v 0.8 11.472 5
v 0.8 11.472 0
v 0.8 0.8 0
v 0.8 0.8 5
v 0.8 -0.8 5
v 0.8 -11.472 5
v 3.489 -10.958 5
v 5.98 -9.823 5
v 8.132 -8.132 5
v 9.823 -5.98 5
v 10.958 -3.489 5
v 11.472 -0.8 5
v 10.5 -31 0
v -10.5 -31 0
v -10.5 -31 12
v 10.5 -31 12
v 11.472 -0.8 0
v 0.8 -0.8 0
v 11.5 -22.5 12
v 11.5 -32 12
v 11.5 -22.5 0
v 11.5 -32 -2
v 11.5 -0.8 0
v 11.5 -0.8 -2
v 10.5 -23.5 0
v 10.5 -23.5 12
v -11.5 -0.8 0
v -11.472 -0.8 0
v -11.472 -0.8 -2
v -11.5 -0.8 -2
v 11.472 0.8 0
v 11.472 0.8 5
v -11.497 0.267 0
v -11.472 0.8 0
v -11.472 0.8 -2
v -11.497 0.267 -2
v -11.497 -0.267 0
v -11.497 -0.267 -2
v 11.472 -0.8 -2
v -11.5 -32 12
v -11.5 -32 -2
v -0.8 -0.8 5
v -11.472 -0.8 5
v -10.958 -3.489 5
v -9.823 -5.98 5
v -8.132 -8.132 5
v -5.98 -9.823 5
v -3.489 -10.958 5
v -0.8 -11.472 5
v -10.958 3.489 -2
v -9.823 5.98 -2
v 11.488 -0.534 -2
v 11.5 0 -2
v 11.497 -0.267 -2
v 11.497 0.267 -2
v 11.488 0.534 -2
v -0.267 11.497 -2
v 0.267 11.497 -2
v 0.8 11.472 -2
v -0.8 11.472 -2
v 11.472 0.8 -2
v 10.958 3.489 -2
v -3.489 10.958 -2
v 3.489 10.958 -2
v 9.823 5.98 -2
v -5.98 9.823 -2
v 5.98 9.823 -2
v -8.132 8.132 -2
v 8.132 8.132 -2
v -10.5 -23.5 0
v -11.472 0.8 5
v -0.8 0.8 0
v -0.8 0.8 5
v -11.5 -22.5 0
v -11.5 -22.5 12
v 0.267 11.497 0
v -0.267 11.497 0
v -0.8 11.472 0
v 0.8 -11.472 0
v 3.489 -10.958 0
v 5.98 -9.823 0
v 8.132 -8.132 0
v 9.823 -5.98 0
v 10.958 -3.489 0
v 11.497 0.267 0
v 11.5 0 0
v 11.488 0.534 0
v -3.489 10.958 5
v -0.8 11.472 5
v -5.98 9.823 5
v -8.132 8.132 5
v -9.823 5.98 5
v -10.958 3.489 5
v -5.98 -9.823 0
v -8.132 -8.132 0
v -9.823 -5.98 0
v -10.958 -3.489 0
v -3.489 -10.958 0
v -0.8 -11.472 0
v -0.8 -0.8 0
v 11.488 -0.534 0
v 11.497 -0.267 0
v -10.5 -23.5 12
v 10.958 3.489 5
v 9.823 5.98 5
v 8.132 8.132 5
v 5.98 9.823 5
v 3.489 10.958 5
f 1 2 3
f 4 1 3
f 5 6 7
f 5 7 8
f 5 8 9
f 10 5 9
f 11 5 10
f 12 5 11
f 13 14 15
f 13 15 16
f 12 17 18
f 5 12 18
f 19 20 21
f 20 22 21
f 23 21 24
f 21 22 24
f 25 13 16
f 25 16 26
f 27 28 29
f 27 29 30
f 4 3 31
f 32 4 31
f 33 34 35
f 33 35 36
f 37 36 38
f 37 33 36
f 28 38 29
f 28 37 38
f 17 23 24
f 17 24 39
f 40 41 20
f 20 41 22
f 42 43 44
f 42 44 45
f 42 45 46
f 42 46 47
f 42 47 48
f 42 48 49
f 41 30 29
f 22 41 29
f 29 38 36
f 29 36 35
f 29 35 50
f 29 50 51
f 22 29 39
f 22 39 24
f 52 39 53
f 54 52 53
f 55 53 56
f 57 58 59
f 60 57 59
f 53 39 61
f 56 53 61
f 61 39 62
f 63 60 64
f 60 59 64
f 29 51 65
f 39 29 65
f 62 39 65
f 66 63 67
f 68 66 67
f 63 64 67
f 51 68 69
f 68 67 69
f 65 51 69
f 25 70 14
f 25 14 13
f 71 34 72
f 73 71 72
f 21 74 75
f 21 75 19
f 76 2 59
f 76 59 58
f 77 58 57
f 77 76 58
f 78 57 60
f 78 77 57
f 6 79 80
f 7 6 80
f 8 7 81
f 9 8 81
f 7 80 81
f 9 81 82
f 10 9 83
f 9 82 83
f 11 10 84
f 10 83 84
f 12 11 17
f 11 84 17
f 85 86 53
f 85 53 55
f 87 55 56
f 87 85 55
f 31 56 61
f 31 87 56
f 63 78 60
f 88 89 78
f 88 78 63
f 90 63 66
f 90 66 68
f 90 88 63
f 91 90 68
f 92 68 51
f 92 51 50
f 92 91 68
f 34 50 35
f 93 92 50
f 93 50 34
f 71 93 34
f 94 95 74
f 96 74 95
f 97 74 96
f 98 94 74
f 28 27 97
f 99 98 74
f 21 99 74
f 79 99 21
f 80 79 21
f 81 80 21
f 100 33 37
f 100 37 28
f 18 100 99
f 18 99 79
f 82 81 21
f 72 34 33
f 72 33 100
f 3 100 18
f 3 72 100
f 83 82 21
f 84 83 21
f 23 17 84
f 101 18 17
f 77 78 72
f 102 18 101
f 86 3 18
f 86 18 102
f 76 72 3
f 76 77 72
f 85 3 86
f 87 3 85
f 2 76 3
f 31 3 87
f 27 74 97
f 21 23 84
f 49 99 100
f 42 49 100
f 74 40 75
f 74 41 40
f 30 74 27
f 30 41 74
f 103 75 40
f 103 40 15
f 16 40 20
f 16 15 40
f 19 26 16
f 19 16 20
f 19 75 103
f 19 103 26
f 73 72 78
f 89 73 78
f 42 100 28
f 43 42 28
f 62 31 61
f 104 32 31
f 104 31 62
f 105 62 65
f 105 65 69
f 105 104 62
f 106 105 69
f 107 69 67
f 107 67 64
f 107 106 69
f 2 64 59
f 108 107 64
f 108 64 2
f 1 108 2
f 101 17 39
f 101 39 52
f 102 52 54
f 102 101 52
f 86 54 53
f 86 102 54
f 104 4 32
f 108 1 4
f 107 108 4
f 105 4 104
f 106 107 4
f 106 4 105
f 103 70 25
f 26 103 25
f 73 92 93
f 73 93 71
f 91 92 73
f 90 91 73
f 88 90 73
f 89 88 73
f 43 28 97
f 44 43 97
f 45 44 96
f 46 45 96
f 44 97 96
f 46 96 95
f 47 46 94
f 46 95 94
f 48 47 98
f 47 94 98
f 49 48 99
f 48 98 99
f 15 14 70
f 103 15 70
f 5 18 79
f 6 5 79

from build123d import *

# Parameters (mm, degrees)
F0_W     = 23
F0_H     = 9.5
F0_W_2   = 21
F0_H_2   = 7.5
F1_DEPTH = 2
F2_DEPTH = 5
F3_DEPTH = 7
F4_DEPTH = 2


with BuildPart() as f1:
    # F0 (on Top) → F1 (new body)
    with BuildSketch(Plane.XY):
        with BuildLine():
            Line((-0.8, 0.8), (-0.8, 11.4721401665))
            ThreePointArc((-0.8, 11.4721401665), (-8.1317279836, 8.1317279836), (-11.4721401665, 0.8))
            Line((-11.4721401665, 0.8), (-0.8, 0.8))
        make_face()
        with BuildLine():
            ThreePointArc((11.4721401665, 0.8), (8.1317279836, 8.1317279836), (0.8, 11.4721401665))
            Line((0.8, 11.4721401665), (0.8, 0.8))
            Line((0.8, 0.8), (11.4721401665, 0.8))
        make_face()
        with Locations((0, -27.25)):
            Rectangle(F0_W, F0_H)
        with Locations((0, -27.25)):
            Rectangle(F0_W_2, F0_H_2, mode=Mode.SUBTRACT)
        with BuildLine():
            Line((-0.8, -0.8), (-11.4721401665, -0.8))
            ThreePointArc((-11.4721401665, -0.8), (-8.1317279836, -8.1317279836), (-0.8, -11.4721401665))
            Line((-0.8, -11.4721401665), (-0.8, -0.8))
        make_face()
        with BuildLine():
            Line((0.8, -0.8), (0.8, -11.4721401665))
            ThreePointArc((0.8, -11.4721401665), (8.1317279836, -8.1317279836), (11.4721401665, -0.8))
            Line((11.4721401665, -0.8), (0.8, -0.8))
        make_face()
        with BuildLine():
            ThreePointArc((-0.8, -11.4721401665), (-8.1317279836, -8.1317279836), (-11.4721401665, -0.8))
            Line((-11.4721401665, -0.8), (-11.5, -0.8))
            Line((-11.5, -0.8), (-11.5, -22.5))
            Line((-11.5, -22.5), (11.5, -22.5))
            Line((11.5, -22.5), (11.5, -0.8))
            Line((11.5, -0.8), (11.4721401665, -0.8))
            ThreePointArc((11.4721401665, -0.8), (8.1317279836, -8.1317279836), (0.8, -11.4721401665))
            ThreePointArc((0.8, -11.4721401665), (0, -11.5), (-0.8, -11.4721401665))
        make_face()
        with BuildLine():
            ThreePointArc((0.8, 11.4721401665), (0, 11.5), (-0.8, 11.4721401665))
            Line((-0.8, 11.4721401665), (-0.8, 0.8))
            Line((-0.8, 0.8), (-11.4721401665, 0.8))
            ThreePointArc((-11.4721401665, 0.8), (-11.5, 0), (-11.4721401665, -0.8))
            Line((-11.4721401665, -0.8), (-0.8, -0.8))
            Line((-0.8, -0.8), (-0.8, -11.4721401665))
            ThreePointArc((-0.8, -11.4721401665), (0, -11.5), (0.8, -11.4721401665))
            Line((0.8, -11.4721401665), (0.8, -0.8))
            Line((0.8, -0.8), (11.4721401665, -0.8))
            ThreePointArc((11.4721401665, -0.8), (11.4930329312, -0.4002424797), (11.5, 0))
            ThreePointArc((11.5, 0), (11.4930329312, 0.4002424797), (11.4721401665, 0.8))
            Line((11.4721401665, 0.8), (0.8, 0.8))
            Line((0.8, 0.8), (0.8, 11.4721401665))
        make_face()
    extrude(amount=-F1_DEPTH)

    # F0 (on Top) → F2 (join)
    with BuildSketch(Plane.XY):
        with BuildLine():
            Line((-0.8, 0.8), (-0.8, 11.4721401665))
            ThreePointArc((-0.8, 11.4721401665), (-8.1317279836, 8.1317279836), (-11.4721401665, 0.8))
            Line((-11.4721401665, 0.8), (-0.8, 0.8))
        make_face()
        with BuildLine():
            ThreePointArc((11.4721401665, 0.8), (8.1317279836, 8.1317279836), (0.8, 11.4721401665))
            Line((0.8, 11.4721401665), (0.8, 0.8))
            Line((0.8, 0.8), (11.4721401665, 0.8))
        make_face()
        with BuildLine():
            Line((0.8, -0.8), (0.8, -11.4721401665))
            ThreePointArc((0.8, -11.4721401665), (8.1317279836, -8.1317279836), (11.4721401665, -0.8))
            Line((11.4721401665, -0.8), (0.8, -0.8))
        make_face()
        with BuildLine():
            Line((-0.8, -0.8), (-11.4721401665, -0.8))
            ThreePointArc((-11.4721401665, -0.8), (-8.1317279836, -8.1317279836), (-0.8, -11.4721401665))
            Line((-0.8, -11.4721401665), (-0.8, -0.8))
        make_face()
        with Locations((0, -27.25)):
            Rectangle(F0_W, F0_H)
        with Locations((0, -27.25)):
            Rectangle(F0_W_2, F0_H_2, mode=Mode.SUBTRACT)
    extrude(amount=F2_DEPTH)

    # F3 (add): a face of the model
    f3_faces = [f1.faces().sort_by_distance(p)[0] for p in [
        (0, -22.7488473428, 5),
    ]]
    extrude(f3_faces, amount=F3_DEPTH)

    # F0 (on Top) → F4 (join)
    with BuildSketch(Plane.XY):
        with Locations((0, -27.25)):
            Rectangle(F0_W_2, F0_H_2)
    extrude(amount=-F4_DEPTH)


solid = f1.part
